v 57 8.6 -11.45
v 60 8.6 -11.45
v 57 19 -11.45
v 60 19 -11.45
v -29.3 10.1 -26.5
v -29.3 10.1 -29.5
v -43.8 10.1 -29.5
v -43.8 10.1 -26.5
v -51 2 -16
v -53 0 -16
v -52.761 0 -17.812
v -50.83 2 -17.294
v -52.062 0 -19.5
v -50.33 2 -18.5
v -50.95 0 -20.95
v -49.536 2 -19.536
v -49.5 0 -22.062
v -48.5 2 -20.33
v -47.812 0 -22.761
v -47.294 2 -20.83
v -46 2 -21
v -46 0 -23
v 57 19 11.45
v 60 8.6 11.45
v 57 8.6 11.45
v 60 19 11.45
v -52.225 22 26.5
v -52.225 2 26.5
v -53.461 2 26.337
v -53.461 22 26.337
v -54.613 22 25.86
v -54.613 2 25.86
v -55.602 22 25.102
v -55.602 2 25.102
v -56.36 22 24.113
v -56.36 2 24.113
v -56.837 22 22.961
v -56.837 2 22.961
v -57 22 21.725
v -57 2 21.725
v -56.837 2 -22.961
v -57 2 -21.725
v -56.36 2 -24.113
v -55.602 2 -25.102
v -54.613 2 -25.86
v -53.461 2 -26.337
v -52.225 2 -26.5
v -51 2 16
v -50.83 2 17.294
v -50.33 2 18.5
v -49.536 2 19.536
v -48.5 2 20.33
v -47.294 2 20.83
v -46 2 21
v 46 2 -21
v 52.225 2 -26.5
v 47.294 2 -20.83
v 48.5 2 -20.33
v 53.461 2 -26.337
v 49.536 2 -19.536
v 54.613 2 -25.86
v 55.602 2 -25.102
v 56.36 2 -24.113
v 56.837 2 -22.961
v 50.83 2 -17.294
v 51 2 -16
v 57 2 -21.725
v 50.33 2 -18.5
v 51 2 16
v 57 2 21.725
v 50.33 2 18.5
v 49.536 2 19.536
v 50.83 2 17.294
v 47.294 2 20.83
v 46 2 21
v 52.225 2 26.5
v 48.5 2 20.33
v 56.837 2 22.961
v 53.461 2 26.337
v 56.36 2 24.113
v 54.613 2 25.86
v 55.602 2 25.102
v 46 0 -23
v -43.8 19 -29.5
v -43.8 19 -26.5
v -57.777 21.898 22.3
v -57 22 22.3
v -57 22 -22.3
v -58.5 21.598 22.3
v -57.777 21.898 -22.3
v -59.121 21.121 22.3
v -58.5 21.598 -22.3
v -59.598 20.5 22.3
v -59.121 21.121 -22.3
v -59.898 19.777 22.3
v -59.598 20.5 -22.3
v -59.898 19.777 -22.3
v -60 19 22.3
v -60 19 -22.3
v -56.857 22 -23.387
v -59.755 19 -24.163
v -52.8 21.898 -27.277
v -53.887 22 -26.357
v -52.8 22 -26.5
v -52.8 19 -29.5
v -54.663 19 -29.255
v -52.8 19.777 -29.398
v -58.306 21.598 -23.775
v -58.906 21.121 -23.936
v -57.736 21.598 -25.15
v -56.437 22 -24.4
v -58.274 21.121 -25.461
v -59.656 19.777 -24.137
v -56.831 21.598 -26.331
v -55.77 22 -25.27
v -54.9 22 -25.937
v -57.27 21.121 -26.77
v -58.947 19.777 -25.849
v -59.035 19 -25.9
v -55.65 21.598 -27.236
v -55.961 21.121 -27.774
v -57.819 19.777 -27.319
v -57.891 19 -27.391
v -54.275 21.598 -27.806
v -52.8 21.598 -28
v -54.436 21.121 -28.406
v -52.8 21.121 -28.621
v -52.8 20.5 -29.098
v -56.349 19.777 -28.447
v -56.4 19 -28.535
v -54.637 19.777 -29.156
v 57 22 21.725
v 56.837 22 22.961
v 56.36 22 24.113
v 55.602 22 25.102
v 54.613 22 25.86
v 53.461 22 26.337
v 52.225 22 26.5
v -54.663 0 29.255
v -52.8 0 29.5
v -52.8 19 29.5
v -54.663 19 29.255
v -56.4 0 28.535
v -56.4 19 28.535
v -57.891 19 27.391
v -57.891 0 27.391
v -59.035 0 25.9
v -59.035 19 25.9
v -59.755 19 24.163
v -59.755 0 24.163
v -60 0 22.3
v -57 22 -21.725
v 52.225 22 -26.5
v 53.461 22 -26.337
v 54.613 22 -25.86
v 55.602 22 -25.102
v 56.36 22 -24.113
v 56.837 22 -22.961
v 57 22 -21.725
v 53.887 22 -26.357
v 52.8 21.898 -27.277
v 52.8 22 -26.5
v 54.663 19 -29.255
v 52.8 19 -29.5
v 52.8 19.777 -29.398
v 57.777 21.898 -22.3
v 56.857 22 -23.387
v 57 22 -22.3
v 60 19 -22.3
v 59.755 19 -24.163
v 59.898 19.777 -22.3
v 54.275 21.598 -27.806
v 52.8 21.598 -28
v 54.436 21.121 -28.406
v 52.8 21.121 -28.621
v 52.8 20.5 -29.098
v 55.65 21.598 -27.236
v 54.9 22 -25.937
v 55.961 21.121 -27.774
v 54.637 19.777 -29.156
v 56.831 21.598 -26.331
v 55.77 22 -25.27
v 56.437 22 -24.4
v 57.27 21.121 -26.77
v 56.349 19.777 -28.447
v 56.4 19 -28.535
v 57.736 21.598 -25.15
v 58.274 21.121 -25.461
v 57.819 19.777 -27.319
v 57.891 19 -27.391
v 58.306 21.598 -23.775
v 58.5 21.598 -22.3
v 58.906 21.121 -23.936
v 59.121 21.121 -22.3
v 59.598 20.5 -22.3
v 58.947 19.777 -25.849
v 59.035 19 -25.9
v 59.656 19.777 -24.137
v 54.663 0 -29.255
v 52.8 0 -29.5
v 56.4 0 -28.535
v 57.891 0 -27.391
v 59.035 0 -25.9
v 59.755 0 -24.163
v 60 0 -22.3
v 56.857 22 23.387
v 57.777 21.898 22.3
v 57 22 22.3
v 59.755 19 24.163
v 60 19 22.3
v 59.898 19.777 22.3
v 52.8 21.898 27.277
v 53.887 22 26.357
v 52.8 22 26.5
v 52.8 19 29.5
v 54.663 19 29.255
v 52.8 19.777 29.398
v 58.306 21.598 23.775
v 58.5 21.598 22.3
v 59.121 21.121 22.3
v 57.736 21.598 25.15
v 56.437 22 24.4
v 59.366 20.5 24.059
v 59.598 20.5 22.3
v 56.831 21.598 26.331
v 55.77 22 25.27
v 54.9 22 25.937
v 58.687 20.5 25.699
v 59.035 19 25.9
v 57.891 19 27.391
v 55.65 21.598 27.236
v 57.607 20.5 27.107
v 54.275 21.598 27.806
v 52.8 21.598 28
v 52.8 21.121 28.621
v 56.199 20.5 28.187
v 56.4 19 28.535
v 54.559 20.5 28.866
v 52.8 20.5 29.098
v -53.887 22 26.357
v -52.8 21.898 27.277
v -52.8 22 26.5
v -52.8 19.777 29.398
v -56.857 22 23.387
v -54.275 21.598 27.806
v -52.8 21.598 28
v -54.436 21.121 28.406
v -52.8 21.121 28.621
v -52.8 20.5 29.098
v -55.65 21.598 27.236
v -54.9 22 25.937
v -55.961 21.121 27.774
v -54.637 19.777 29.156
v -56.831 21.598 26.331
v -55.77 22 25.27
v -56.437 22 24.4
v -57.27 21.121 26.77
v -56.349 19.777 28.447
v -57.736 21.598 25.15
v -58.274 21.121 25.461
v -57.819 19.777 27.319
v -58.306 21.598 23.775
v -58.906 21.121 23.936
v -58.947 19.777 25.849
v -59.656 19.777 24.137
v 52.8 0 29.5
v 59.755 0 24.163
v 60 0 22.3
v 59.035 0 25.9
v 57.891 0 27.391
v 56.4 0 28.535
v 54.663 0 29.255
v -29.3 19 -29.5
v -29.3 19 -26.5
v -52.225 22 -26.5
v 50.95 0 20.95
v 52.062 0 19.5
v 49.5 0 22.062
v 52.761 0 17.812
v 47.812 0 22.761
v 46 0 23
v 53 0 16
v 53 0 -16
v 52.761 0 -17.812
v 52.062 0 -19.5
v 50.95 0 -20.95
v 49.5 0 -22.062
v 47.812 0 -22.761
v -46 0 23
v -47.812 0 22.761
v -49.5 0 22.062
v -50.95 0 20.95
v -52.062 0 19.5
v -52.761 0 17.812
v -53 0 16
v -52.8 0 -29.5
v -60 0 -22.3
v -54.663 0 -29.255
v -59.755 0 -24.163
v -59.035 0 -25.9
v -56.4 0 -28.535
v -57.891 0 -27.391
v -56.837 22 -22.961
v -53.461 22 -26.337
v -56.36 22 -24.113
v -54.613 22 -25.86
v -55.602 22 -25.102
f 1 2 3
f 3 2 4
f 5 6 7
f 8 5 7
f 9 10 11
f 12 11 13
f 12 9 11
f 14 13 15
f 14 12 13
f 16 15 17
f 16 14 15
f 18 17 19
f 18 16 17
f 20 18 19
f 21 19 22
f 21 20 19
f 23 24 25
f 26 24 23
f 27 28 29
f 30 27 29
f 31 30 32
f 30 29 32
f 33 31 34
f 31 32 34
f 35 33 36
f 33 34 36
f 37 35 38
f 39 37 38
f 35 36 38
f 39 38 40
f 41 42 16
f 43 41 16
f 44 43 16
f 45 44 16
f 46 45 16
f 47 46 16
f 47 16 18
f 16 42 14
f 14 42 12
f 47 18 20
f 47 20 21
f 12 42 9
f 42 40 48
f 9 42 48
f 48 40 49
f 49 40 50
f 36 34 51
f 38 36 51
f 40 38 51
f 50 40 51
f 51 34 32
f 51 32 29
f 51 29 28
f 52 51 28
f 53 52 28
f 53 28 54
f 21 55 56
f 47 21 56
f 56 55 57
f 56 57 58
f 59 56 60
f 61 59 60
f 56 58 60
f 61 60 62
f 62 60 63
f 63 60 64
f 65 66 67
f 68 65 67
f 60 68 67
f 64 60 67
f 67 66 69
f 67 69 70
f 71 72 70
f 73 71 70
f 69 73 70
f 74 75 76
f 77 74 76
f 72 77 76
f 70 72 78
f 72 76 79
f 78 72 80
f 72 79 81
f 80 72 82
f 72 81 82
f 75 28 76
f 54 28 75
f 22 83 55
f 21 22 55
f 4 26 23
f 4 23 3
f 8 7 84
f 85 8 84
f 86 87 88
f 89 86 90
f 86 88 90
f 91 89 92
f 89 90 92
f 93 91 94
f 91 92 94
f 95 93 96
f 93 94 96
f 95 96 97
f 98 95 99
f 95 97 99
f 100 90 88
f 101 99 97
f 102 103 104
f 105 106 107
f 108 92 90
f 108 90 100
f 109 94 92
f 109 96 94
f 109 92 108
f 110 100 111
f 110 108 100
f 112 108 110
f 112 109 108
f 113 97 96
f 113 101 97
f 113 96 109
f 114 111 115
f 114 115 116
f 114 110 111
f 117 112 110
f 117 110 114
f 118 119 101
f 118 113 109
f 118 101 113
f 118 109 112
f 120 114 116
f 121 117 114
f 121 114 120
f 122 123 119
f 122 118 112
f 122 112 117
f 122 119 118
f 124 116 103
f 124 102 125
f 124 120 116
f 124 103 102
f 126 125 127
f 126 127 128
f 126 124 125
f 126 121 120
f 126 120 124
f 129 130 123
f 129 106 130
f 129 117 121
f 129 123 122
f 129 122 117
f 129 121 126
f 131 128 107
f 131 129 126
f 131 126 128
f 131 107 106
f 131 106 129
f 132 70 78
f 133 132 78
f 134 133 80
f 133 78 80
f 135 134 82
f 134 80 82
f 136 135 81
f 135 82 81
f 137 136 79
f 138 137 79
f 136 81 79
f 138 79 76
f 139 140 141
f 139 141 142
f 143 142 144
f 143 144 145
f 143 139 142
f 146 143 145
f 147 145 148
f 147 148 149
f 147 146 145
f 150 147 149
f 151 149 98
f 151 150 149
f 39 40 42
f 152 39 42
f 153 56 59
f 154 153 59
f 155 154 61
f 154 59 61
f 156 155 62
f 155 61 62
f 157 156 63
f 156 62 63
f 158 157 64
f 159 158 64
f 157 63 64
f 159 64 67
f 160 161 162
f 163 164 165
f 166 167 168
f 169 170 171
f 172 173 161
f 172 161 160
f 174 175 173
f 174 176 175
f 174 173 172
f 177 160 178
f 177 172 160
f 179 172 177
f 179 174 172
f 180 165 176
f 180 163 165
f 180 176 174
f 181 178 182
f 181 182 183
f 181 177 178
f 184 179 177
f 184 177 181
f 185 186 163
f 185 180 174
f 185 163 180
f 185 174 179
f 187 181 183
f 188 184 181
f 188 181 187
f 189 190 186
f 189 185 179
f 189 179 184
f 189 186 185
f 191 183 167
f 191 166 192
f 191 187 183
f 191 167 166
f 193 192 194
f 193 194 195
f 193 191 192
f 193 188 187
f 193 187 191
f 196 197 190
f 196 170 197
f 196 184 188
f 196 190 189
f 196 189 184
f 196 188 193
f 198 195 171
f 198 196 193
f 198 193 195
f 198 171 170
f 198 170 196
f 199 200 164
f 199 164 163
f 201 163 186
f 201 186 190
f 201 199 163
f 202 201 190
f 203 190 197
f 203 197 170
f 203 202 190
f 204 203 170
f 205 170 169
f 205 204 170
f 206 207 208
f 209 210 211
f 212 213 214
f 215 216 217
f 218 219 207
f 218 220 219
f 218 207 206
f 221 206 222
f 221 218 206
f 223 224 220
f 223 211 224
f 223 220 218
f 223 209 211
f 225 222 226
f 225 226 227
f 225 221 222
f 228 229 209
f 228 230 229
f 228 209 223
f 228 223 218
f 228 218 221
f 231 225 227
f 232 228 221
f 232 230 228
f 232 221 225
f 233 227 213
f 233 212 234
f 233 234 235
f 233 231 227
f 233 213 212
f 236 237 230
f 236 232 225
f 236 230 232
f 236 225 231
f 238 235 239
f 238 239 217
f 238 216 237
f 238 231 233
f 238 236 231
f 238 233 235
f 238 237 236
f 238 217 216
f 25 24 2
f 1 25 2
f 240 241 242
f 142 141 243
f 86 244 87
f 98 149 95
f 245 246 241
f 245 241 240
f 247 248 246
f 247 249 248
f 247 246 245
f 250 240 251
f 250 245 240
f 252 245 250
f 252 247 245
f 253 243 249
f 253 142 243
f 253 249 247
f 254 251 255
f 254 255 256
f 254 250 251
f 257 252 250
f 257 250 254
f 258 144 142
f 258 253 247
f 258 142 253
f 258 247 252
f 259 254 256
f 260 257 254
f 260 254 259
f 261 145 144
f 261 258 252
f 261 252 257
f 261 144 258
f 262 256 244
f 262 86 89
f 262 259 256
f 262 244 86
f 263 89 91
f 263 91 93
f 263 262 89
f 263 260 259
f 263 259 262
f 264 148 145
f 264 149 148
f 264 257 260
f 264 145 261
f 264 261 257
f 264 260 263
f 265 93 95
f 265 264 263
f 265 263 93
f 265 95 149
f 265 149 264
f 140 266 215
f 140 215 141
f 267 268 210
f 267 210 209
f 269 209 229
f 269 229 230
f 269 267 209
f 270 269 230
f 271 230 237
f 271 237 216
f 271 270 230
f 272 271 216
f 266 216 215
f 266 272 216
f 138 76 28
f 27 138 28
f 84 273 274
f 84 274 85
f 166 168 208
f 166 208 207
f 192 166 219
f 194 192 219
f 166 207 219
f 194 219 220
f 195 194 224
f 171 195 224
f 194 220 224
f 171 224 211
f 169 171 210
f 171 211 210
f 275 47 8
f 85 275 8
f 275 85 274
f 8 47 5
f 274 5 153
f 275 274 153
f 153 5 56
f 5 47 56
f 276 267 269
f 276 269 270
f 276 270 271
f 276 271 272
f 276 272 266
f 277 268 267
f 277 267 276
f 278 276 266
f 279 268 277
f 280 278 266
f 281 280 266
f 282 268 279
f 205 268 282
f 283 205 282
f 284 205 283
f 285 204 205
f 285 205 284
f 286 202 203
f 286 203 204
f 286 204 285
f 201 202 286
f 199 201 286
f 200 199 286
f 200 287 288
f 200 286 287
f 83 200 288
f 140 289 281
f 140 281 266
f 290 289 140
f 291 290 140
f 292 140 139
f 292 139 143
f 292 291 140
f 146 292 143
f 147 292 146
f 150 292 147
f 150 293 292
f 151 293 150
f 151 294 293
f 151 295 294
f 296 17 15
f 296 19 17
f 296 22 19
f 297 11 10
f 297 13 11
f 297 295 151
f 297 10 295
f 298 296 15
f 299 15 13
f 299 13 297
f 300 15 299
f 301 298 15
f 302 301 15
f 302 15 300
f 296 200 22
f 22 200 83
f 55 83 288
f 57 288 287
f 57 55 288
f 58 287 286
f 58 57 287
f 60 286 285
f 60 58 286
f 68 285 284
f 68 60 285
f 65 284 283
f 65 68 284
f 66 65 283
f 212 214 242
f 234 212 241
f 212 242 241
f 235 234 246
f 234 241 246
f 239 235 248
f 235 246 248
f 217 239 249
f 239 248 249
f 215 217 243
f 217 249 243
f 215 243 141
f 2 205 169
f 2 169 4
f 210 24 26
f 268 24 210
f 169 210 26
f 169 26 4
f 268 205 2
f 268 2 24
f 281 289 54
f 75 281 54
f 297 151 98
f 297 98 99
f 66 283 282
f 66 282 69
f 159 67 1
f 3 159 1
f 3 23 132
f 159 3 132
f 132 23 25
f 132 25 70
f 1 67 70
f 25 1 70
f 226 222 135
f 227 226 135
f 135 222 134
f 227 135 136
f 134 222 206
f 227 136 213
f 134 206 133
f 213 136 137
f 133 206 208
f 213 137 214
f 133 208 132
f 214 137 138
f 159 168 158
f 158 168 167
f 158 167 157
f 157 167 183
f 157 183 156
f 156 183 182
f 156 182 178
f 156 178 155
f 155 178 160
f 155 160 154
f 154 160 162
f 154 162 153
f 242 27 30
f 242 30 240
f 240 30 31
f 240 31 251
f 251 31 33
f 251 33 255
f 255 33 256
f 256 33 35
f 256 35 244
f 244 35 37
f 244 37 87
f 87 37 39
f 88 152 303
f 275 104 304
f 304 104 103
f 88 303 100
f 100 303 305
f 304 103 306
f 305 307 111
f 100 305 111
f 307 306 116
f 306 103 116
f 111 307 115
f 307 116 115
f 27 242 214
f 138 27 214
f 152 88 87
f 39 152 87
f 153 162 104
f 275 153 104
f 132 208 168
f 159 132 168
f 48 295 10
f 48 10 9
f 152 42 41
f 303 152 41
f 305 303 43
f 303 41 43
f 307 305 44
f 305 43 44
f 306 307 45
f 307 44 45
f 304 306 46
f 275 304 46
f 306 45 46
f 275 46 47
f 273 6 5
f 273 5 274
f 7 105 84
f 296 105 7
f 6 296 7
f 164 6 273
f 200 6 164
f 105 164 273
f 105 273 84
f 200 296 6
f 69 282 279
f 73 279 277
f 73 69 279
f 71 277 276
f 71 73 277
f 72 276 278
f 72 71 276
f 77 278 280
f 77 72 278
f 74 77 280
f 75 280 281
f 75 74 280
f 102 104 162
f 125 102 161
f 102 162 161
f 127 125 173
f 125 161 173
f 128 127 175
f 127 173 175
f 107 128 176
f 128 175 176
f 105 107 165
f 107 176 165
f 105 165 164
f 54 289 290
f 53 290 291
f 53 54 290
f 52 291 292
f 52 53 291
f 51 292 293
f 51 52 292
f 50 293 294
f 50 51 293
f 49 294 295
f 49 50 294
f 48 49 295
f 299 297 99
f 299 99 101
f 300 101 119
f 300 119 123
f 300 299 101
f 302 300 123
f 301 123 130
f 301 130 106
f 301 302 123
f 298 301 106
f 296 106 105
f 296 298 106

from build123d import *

# Parameters (mm, degrees)
SALIENTE_EXTRUIR2_DEPTH = 22
SALIENTE_EXTRUIR3_DEPTH = 2
CORTAR_EXTRUIR1_DEPTH   = 2
CHAFL_N1_SIZE           = 3
REDONDEO2_R             = 3
CROQUIS4_W              = 22.9
CROQUIS4_H              = 10.4
CORTAR_EXTRUIR2_DEPTH   = 10
CROQUIS5_W              = 14.5
CROQUIS5_H              = 8.9
CORTAR_EXTRUIR3_DEPTH   = 10


# Some blends are built 0.0001 mm under size
with BuildPart() as part:
    # Croquis1 → Saliente-Extruir2 (new body)
    with BuildSketch(Plane(origin=(0, 0, 0), x_dir=(1, 0, 0), z_dir=(0, 1, 0))):
        with BuildLine():
            Line((-52.8, 29.5), (52.8, 29.5))
            ThreePointArc((52.8, 29.5), (57.891168825, 27.391168825), (60, 22.3))
            Line((60, 22.3), (60, -22.3))
            ThreePointArc((60, -22.3), (57.891168825, -27.391168825), (52.8, -29.5))
            Line((52.8, -29.5), (-52.8, -29.5))
            ThreePointArc((-52.8, -29.5), (-57.891168825, -27.391168825), (-60, -22.3))
            Line((-60, -22.3), (-60, 22.3))
            ThreePointArc((-60, 22.3), (-57.891168825, 27.391168825), (-52.8, 29.5))
        make_face()
        with BuildLine():
            Line((-52.225351705, 26.5), (52.225351705, 26.5))
            ThreePointArc((52.225351705, 26.5), (55.601537892, 25.101537892), (57, 21.725351705))
            Line((57, 21.725351705), (57, -21.725351705))
            ThreePointArc((57, -21.725351705), (55.601537892, -25.101537892), (52.225351705, -26.5))
            Line((52.225351705, -26.5), (-52.225351705, -26.5))
            ThreePointArc((-52.225351705, -26.5), (-55.601537892, -25.101537892), (-57, -21.725351705))
            Line((-57, -21.725351705), (-57, 21.725351705))
            ThreePointArc((-57, 21.725351705), (-55.601537892, 25.101537892), (-52.225351705, 26.5))
        make_face(mode=Mode.SUBTRACT)
    extrude(amount=SALIENTE_EXTRUIR2_DEPTH)

    # Croquis2 → Saliente-Extruir3 (add)
    with BuildSketch(Plane.XZ):
        with BuildLine():
            Line((-60, 22.3), (-60, -22.3))
            ThreePointArc((-60, -22.3), (-57.891168825, -27.391168825), (-52.8, -29.5))
            Line((-52.8, -29.5), (52.8, -29.5))
            ThreePointArc((52.8, -29.5), (57.891168825, -27.391168825), (60, -22.3))
            Line((60, -22.3), (60, 22.3))
            ThreePointArc((60, 22.3), (57.891168825, 27.391168825), (52.8, 29.5))
            Line((52.8, 29.5), (-52.8, 29.5))
            ThreePointArc((-52.8, 29.5), (-57.891168825, 27.391168825), (-60, 22.3))
        make_face()
    extrude(amount=-SALIENTE_EXTRUIR3_DEPTH)

    # Croquis3 → Cortar-Extruir1 (cut)
    with BuildSketch(Plane(origin=(0, 2, 0), x_dir=(1, 0, 0), z_dir=(0, 1, 0))):
        with BuildLine():
            Line((-46, 20), (46, 20))
            ThreePointArc((46, 20), (48.828427125, 18.828427125), (50, 16))
            Line((50, 16), (50, -16))
            ThreePointArc((50, -16), (48.828427125, -18.828427125), (46, -20))
            Line((46, -20), (-46, -20))
            ThreePointArc((-46, -20), (-48.828427125, -18.828427125), (-50, -16))
            Line((-50, -16), (-50, 16))
            ThreePointArc((-50, 16), (-48.828427125, 18.828427125), (-46, 20))
        make_face()
    extrude(amount=-CORTAR_EXTRUIR1_DEPTH, mode=Mode.SUBTRACT)

    # Chaflán1
    # the kernel refuses this chamfer: 3 mm, written as the material it takes off along each edge
    with BuildSketch(Plane(origin=(-50, 0, 16), x_dir=(-0.9996219169112968, -0.02749587661058636, 0), z_dir=(0, 0, -1)), Plane(origin=(50, 0, -16), x_dir=(0.9996219169112968, -0.02749587661058636, 0), z_dir=(0, 0, 1))) as chafl_n1_piece_1:
        Polygon((CHAFL_N1_SIZE * 0.999621916911, CHAFL_N1_SIZE * 0.0274958766106), (-CHAFL_N1_SIZE * 0.0274958766106, CHAFL_N1_SIZE * 0.999621916911), (0, 0), align=None)
    extrude(amount=32, mode=Mode.SUBTRACT)
    with BuildSketch(Plane(origin=(-46, 0, 16), x_dir=(0, 0, 1), z_dir=(1, 0, 0))) as chafl_n1_piece_2:
        Polygon((4 + CHAFL_N1_SIZE, 0), (4, -CHAFL_N1_SIZE), (4, 0), align=None)
    revolve(axis=Axis((-46, 0, 16), (0, -1, 0)), revolution_arc=90, mode=Mode.SUBTRACT)
    with BuildSketch(Plane(origin=(-46, 0, -16), x_dir=(-1, 0, 0), z_dir=(0, 0, 1))) as chafl_n1_piece_3:
        Polygon((4 + CHAFL_N1_SIZE, 0), (4, -CHAFL_N1_SIZE), (4, 0), align=None)
    revolve(axis=Axis((-46, 0, -16), (0, -1, 0)), revolution_arc=90, mode=Mode.SUBTRACT)
    with BuildSketch(Plane(origin=(46, 0, 20), x_dir=(0, -0.02749587661058636, 0.9996219169112968), z_dir=(-1, 0, 0)), Plane(origin=(-46, 0, -20), x_dir=(0, -0.02749587661058636, -0.9996219169112968), z_dir=(1, 0, 0))) as chafl_n1_piece_4:
        Polygon((CHAFL_N1_SIZE * 0.999621916911, CHAFL_N1_SIZE * 0.0274958766106), (-CHAFL_N1_SIZE * 0.0274958766106, CHAFL_N1_SIZE * 0.999621916911), (0, 0), align=None)
    extrude(amount=92, mode=Mode.SUBTRACT)
    with BuildSketch(Plane(origin=(46, 0, 16), x_dir=(1, 0, 0), z_dir=(0, 0, -1))) as chafl_n1_piece_5:
        Polygon((4 + CHAFL_N1_SIZE, 0), (4, -CHAFL_N1_SIZE), (4, 0), align=None)
    revolve(axis=Axis((46, 0, 16), (0, -1, 0)), revolution_arc=90, mode=Mode.SUBTRACT)
    with BuildSketch(Plane(origin=(46, 0, -16), x_dir=(0, 0, -1), z_dir=(-1, 0, 0))) as chafl_n1_piece_6:
        Polygon((4 + CHAFL_N1_SIZE, 0), (4, -CHAFL_N1_SIZE), (4, 0), align=None)
    revolve(axis=Axis((46, 0, -16), (0, -1, 0)), revolution_arc=90, mode=Mode.SUBTRACT)

    # Redondeo2
    redondeo2_edges = [part.edges().sort_by_distance(p)[0] for p in [
        (57.891168825, 22, 27.391168825),
        (60, 22, 0),
        (57.891168825, 22, -27.391168825),
        (0, 22, -29.5),
        (-57.891168825, 22, -27.391168825),
        (-60, 22, 0),
        (-57.891168825, 22, 27.391168825),
        (0, 22, 29.5),
    ]]
    fillet(redondeo2_edges, radius=REDONDEO2_R - 0.0001)  # a hair under: the kernel refuses the full size

    # Croquis4 → Cortar-Extruir2 (cut)
    with BuildSketch(Plane(origin=(60, 0, 0), x_dir=(0, 0, -1), z_dir=(1, 0, 0))):
        with Locations((0, 13.8)):
            Rectangle(CROQUIS4_W, CROQUIS4_H)
    extrude(amount=-CORTAR_EXTRUIR2_DEPTH, mode=Mode.SUBTRACT)

    # Croquis5 → Cortar-Extruir3 (cut)
    with BuildSketch(Plane(origin=(0, 0, -29.5), x_dir=(-1, 0, 0), z_dir=(0, 0, -1))):
        with Locations((36.55, 14.55)):
            Rectangle(CROQUIS5_W, CROQUIS5_H)
    extrude(amount=-CORTAR_EXTRUIR3_DEPTH, mode=Mode.SUBTRACT)


solid = part.part
